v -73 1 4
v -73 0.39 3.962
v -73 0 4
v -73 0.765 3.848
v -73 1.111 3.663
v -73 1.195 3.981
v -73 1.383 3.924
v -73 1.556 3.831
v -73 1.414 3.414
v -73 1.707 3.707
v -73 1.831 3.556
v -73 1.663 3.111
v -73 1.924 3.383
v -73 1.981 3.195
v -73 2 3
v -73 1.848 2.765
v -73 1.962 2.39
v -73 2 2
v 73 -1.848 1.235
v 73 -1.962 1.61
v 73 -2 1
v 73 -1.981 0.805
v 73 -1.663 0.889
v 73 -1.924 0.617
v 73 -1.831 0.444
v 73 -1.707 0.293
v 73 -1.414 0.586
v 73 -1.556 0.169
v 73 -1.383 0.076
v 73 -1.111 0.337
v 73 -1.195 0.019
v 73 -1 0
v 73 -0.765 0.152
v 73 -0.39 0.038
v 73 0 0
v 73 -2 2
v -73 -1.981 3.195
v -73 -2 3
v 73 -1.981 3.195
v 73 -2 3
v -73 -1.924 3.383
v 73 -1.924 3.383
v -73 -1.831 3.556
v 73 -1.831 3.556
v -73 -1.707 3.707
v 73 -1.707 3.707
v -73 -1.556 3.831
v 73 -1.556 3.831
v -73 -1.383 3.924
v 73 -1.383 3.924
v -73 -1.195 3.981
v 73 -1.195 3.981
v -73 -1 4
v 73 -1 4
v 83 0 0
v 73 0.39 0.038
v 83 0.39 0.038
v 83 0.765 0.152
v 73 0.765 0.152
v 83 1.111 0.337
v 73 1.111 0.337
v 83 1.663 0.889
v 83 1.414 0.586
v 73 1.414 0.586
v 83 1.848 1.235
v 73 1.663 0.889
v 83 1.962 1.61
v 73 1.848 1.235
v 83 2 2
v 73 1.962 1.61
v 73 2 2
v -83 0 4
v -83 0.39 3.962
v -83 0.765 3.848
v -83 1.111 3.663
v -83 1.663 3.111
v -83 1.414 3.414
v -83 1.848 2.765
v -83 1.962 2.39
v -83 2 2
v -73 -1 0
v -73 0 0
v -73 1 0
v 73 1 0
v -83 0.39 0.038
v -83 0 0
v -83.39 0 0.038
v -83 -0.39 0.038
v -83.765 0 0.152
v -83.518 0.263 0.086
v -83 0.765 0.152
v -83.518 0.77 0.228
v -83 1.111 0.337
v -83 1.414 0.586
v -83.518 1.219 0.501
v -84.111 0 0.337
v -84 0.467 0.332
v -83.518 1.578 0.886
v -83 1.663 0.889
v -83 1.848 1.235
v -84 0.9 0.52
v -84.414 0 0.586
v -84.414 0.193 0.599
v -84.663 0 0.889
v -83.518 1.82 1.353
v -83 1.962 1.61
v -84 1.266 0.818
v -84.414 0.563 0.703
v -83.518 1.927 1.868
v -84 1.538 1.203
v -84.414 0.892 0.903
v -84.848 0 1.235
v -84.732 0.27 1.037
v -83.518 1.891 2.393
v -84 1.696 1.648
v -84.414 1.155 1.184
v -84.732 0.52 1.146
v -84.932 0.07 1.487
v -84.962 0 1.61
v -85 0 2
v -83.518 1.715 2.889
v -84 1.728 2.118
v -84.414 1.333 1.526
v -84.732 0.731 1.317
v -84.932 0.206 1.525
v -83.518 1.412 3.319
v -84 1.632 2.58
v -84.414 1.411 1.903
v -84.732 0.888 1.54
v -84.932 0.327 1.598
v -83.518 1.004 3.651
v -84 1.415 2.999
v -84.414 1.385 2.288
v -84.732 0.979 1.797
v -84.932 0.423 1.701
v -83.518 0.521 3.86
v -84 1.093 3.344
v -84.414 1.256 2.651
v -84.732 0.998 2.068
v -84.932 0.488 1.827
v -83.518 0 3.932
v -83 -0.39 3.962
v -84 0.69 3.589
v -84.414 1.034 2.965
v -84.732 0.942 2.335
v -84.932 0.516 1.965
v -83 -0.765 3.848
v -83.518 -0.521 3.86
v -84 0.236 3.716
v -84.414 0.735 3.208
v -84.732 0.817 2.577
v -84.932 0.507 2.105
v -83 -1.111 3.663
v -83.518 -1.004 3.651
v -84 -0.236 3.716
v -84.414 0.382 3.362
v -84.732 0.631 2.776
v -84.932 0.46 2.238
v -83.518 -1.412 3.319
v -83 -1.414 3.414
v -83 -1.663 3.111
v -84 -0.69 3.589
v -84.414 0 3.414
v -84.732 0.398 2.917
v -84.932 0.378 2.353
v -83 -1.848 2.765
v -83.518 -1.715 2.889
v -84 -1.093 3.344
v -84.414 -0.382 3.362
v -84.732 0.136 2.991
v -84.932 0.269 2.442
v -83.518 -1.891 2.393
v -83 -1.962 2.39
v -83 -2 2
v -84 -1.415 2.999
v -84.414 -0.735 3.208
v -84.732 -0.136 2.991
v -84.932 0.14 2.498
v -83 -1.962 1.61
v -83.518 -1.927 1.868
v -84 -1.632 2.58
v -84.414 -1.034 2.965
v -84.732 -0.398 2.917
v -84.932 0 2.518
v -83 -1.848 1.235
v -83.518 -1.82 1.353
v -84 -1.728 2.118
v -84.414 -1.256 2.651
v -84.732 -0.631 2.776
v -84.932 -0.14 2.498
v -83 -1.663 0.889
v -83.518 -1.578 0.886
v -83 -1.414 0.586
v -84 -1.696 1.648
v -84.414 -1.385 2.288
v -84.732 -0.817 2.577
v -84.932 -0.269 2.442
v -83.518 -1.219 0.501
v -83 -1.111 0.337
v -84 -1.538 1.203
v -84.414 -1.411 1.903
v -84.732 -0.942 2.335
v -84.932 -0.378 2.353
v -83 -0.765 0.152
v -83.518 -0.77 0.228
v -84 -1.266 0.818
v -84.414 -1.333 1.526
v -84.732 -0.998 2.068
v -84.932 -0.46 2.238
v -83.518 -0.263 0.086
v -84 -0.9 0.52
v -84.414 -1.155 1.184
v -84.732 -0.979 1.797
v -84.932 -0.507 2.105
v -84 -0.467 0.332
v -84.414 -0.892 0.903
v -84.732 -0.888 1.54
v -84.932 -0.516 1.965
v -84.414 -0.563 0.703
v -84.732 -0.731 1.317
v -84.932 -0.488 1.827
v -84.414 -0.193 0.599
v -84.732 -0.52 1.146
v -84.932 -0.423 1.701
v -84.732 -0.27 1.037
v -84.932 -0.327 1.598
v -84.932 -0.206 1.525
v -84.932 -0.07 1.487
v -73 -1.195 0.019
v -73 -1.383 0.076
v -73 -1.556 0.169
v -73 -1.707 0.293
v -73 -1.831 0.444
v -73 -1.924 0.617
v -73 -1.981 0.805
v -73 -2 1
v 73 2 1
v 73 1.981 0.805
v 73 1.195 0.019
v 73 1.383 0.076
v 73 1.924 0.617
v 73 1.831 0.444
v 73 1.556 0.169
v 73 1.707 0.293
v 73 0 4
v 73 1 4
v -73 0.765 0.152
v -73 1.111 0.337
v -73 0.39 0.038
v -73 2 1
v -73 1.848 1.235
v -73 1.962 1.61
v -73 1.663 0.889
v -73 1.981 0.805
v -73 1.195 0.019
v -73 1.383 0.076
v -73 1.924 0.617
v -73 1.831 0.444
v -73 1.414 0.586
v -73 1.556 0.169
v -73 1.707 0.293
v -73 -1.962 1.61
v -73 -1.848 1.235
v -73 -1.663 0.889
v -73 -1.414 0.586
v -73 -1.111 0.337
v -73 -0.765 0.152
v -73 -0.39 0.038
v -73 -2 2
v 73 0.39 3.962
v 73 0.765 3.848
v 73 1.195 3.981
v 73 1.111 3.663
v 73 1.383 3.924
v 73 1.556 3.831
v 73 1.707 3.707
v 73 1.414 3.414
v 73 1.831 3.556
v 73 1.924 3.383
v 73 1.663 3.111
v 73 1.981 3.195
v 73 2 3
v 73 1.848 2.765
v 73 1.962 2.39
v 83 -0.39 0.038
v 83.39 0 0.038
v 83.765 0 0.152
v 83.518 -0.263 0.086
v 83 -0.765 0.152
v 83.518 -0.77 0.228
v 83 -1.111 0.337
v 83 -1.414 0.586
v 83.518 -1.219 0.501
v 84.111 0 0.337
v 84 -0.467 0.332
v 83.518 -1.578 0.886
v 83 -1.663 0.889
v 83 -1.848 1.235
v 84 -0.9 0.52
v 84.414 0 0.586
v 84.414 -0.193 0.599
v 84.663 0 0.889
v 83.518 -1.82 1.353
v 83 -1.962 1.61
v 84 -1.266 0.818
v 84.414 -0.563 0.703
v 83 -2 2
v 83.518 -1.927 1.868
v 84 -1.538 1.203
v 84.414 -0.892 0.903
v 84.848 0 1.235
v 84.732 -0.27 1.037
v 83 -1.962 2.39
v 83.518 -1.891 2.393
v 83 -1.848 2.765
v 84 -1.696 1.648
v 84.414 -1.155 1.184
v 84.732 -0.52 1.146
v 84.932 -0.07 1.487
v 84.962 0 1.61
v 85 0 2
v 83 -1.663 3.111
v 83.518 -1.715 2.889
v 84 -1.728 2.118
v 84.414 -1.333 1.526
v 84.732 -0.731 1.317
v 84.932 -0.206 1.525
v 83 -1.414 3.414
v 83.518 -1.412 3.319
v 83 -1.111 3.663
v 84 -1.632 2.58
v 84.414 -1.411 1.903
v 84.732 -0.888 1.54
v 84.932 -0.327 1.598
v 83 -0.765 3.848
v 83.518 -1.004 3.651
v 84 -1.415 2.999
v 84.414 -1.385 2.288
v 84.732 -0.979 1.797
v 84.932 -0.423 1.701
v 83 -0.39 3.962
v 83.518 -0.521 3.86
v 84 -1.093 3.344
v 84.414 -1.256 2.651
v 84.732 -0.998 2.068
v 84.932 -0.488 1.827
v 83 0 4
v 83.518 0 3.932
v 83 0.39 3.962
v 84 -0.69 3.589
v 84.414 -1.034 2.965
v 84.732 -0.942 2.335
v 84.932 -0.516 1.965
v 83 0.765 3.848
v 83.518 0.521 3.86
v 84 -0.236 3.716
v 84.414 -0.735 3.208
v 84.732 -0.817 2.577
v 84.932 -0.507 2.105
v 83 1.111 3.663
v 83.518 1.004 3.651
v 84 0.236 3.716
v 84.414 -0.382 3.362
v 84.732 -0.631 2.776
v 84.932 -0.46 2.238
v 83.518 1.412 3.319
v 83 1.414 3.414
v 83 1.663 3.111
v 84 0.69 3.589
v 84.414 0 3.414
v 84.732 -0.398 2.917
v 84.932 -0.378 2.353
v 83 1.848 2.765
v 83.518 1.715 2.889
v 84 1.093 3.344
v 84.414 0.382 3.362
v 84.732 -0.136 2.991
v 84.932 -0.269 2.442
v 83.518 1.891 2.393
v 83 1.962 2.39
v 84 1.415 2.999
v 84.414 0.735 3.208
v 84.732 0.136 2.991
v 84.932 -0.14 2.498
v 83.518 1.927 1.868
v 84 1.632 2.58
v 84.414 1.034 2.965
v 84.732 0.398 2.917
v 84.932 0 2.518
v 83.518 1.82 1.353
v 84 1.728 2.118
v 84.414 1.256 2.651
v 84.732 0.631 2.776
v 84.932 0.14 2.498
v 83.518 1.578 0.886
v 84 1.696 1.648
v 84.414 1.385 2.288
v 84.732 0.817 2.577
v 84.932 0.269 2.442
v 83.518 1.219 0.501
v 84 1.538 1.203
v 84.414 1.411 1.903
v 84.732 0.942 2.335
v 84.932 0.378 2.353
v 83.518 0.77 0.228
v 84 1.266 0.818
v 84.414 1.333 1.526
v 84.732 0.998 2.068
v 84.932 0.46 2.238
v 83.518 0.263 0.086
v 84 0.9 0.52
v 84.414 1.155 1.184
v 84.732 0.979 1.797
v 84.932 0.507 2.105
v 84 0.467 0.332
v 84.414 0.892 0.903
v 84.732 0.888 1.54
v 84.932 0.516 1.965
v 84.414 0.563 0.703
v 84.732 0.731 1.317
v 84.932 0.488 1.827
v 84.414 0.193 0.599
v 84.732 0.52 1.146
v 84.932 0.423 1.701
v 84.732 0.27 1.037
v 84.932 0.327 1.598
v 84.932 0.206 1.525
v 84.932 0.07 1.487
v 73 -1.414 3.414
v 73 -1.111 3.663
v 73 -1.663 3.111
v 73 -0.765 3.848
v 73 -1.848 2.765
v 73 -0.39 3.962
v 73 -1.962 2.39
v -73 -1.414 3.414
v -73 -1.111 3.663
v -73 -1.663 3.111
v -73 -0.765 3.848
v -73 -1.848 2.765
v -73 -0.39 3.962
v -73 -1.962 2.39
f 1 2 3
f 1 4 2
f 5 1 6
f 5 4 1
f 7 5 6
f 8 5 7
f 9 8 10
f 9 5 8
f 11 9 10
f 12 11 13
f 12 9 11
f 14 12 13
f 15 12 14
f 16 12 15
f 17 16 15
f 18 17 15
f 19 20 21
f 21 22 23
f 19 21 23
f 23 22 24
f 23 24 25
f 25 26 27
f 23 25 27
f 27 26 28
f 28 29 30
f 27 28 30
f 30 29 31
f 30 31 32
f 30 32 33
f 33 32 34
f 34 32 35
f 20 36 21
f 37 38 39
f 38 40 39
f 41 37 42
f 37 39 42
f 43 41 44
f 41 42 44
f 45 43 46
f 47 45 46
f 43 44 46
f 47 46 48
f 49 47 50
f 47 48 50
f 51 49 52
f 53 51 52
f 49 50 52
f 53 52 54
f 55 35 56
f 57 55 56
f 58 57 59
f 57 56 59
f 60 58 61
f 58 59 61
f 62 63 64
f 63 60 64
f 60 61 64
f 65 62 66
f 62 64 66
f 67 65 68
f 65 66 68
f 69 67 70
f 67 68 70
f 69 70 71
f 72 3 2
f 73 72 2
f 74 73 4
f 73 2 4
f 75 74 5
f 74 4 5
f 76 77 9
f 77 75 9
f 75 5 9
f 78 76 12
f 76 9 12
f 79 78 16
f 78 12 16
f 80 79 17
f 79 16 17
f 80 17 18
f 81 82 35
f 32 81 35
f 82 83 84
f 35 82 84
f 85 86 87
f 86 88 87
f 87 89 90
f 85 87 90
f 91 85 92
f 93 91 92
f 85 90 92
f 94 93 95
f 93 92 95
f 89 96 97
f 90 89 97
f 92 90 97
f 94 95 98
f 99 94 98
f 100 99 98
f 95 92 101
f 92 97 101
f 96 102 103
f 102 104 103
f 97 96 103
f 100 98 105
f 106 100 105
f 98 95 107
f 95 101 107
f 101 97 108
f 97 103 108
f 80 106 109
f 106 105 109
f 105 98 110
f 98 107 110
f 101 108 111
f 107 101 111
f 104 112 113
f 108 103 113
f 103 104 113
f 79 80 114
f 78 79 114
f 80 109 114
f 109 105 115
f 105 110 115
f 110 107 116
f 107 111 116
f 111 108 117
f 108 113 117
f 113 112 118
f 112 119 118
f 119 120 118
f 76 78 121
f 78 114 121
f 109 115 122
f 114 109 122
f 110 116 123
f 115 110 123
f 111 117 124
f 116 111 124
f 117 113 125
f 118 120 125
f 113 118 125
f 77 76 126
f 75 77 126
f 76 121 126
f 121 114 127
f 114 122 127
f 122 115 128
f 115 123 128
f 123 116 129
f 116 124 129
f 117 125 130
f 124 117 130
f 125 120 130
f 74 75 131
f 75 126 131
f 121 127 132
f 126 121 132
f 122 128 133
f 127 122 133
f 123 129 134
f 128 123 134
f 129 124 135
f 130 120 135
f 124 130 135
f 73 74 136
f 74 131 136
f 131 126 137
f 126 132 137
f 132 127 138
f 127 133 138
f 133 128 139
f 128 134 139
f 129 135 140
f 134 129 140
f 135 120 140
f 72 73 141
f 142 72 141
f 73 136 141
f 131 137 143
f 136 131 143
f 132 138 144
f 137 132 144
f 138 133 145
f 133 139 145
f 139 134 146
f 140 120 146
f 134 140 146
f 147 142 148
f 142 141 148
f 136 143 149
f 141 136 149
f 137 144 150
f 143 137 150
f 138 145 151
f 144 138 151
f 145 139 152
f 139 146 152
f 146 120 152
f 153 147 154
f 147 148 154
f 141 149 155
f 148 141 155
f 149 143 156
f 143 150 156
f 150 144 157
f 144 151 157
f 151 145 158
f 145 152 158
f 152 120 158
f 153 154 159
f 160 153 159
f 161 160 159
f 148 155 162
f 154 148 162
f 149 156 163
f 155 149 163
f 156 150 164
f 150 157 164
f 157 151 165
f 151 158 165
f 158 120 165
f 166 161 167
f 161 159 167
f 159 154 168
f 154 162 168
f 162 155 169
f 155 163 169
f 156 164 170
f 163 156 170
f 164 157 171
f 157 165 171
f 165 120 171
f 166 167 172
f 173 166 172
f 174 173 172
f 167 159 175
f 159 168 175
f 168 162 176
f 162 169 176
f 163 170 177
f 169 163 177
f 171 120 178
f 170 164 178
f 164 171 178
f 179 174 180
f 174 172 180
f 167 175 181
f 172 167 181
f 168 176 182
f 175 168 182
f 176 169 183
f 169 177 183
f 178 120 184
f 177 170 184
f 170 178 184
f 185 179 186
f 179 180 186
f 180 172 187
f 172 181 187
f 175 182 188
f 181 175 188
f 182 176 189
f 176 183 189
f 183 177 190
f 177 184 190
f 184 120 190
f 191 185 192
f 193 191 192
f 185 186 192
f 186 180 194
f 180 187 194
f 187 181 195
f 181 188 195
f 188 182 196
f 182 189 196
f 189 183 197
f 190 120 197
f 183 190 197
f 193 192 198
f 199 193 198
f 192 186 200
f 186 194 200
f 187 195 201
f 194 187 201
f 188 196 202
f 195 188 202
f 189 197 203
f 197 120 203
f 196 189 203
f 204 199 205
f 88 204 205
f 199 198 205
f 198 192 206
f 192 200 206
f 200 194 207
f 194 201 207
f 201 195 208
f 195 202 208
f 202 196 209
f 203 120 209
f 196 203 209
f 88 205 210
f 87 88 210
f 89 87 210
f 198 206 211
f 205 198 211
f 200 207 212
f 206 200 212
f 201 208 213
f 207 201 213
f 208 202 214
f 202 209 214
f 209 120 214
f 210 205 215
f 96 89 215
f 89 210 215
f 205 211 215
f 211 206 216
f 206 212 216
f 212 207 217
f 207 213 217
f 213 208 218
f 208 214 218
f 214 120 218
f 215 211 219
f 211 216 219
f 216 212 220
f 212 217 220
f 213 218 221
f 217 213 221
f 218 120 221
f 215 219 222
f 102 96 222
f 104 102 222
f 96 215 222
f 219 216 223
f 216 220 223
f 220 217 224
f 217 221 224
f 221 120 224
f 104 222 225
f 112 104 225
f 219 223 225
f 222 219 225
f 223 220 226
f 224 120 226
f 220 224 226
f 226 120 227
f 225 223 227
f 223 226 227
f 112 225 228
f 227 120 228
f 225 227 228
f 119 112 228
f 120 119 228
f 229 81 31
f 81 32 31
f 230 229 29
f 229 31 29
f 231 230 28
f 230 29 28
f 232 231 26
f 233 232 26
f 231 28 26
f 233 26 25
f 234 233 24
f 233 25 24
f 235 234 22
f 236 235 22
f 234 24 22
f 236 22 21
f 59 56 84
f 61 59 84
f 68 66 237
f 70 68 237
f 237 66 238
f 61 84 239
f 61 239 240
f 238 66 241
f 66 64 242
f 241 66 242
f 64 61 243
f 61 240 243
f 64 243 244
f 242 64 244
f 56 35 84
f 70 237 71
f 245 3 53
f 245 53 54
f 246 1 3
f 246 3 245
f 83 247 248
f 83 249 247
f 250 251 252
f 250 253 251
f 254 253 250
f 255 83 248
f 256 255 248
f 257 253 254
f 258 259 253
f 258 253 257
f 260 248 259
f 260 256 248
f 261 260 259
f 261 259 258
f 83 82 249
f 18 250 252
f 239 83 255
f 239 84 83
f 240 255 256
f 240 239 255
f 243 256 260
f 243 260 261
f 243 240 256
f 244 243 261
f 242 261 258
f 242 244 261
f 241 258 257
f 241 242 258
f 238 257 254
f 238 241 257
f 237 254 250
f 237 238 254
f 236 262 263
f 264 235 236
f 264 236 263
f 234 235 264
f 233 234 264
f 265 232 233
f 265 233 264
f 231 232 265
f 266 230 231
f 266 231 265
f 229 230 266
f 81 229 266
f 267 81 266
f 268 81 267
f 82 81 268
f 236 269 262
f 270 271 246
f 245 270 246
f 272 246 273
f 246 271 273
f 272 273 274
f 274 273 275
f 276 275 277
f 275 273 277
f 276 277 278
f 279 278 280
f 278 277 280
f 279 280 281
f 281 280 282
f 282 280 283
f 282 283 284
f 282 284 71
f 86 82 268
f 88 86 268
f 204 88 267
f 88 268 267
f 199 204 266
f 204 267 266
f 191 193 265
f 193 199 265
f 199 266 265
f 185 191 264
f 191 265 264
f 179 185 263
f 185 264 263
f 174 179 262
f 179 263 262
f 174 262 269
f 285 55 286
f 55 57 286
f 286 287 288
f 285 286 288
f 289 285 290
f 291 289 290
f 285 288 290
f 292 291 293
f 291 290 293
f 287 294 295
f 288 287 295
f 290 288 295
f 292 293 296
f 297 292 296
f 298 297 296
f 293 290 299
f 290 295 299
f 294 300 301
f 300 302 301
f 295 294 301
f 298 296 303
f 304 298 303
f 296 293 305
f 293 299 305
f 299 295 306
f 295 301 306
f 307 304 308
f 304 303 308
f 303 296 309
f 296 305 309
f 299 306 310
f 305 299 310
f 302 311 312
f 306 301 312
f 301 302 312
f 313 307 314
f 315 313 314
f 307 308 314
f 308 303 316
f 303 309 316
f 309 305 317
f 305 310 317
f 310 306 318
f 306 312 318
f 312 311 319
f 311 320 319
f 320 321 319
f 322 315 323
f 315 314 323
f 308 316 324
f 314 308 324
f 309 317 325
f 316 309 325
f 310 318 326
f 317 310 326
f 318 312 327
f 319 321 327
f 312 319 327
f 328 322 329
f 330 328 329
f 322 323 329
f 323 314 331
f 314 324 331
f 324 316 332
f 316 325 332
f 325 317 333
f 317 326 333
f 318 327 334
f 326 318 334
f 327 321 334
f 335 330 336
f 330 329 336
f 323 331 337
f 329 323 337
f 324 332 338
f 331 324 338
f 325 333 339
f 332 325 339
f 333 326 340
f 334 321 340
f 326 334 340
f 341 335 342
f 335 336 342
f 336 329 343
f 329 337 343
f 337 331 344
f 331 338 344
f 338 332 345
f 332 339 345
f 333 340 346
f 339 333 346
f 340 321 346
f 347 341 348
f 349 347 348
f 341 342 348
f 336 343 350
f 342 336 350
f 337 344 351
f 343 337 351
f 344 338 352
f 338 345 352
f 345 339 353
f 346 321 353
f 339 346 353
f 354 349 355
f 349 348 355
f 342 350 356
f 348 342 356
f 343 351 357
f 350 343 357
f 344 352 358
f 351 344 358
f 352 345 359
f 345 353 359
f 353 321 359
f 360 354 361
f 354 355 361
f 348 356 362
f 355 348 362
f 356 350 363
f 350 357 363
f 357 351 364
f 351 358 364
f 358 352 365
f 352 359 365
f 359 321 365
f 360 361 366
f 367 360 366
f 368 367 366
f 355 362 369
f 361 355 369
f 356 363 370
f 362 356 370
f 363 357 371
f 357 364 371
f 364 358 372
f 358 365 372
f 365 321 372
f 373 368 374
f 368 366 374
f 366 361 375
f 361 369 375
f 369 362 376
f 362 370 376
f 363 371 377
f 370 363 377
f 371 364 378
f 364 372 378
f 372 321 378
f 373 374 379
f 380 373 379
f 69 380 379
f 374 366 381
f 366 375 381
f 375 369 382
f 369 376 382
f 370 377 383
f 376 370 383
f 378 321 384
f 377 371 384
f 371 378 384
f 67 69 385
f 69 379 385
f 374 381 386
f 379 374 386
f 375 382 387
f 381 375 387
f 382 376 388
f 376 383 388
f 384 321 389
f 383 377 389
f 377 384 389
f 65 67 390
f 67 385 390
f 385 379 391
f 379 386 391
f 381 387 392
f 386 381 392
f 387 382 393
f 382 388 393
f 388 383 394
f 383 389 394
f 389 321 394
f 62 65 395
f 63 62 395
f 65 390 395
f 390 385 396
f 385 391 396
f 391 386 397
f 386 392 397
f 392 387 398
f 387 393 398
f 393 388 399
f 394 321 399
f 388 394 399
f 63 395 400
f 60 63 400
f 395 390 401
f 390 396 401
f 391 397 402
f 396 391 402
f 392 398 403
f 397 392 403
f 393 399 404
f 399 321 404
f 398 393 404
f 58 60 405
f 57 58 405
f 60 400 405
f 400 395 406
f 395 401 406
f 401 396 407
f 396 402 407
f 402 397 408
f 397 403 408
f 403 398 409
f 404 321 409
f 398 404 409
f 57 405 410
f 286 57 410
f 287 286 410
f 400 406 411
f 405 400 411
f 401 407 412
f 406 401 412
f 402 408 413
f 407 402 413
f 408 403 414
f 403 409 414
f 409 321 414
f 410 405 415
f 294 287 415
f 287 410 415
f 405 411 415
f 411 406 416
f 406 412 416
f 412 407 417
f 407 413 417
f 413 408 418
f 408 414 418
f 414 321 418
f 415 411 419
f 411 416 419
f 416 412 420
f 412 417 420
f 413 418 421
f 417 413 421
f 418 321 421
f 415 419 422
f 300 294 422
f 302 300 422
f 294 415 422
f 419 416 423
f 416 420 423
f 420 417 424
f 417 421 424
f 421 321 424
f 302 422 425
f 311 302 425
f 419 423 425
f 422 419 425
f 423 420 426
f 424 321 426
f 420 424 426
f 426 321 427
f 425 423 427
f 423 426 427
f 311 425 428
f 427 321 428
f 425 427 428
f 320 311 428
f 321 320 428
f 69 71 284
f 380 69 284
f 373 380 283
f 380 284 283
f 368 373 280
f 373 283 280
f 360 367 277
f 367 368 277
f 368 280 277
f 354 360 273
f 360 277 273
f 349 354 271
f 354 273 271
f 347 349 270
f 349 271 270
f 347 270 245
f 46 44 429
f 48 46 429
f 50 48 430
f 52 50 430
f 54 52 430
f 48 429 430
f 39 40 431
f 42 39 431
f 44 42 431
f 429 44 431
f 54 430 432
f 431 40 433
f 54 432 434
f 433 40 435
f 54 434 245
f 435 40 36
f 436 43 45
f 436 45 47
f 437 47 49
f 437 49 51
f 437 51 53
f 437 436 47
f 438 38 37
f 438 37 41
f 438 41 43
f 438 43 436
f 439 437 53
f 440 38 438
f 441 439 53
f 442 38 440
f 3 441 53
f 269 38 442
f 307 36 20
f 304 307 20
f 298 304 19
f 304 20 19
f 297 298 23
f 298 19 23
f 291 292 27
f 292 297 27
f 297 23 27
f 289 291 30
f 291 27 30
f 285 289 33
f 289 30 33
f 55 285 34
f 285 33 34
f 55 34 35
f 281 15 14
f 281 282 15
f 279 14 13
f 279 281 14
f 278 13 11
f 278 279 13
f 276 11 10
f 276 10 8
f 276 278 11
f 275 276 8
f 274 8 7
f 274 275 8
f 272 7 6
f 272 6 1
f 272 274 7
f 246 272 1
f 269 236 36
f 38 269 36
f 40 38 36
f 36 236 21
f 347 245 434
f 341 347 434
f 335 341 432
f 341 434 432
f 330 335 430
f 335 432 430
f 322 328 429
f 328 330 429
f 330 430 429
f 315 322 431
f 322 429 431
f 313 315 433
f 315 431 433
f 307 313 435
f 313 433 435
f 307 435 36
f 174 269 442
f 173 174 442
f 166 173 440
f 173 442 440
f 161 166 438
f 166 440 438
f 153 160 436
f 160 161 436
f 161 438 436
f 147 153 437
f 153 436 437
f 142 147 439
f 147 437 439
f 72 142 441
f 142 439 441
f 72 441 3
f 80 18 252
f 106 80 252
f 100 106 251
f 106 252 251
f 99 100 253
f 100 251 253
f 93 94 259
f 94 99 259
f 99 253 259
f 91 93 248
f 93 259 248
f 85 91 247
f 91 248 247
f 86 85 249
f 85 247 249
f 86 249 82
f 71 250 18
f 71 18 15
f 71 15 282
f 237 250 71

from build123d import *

# Parameters (mm, degrees)
F0_W     = 146
F0_H     = 4
F1_DEPTH = 4
F3_DEPTH = 12
F6_DEPTH = 12
F8_R     = 1


# Not quite as in the source:
# - a fillet or chamfer that OpenCascade refuses, or shapes differently, is made with other operations: its cross-section is extruded or revolved along the edge and cut away or added


with BuildPart() as f1:
    # F0 (on Top) → F1 (new body)
    with BuildSketch(Plane.XY):
        Rectangle(F0_W, F0_H)
    extrude(amount=F1_DEPTH)

    # F2 (on face) → F3 (join)
    with BuildSketch(Plane(origin=(-73, 0, 0), x_dir=(0, -1, 0), z_dir=(-1, 0, 0))):
        with BuildLine():
            ThreePointArc((0, 0), (1.4142135624, 0.5857864376), (2, 2))
            ThreePointArc((2, 2), (1.4142135624, 3.4142135624), (0, 4))
            ThreePointArc((0, 4), (-1.4142135624, 3.4142135624), (-2, 2))
            ThreePointArc((-2, 2), (-1.4142135624, 0.5857864376), (0, 0))
        make_face()
    extrude(amount=F3_DEPTH)

    # F4: fillet of radius 2 on 1 edges, made by hand

    # F4_s1 → F4_t2 (revolve, cut)
    with BuildSketch(Plane.XZ):
        with BuildLine():
            ThreePointArc((-83, 0), (-84.4142135624, 0.5857864376), (-85, 2))
            Line((-85, 2), (-85, 0))
            Line((-85, 0), (-83, 0))
        make_face()
    revolve(axis=Axis((-85, 0, 2), (1, 0, 0)), mode=Mode.SUBTRACT)

    # F5 (on face) → F6 (join)
    with BuildSketch(Plane.YZ.offset(73)):
        with BuildLine():
            ThreePointArc((0, 0), (1.4142135624, 0.5857864376), (2, 2))
            ThreePointArc((2, 2), (1.4142135624, 3.4142135624), (0, 4))
            ThreePointArc((0, 4), (-1.4142135624, 3.4142135624), (-2, 2))
            ThreePointArc((-2, 2), (-1.4142135624, 0.5857864376), (0, 0))
        make_face()
    extrude(amount=F6_DEPTH)

    # F7: fillet of radius 2 on 1 edges, made by hand

    # F7_s1 → F7_t2 (revolve, cut)
    with BuildSketch(Plane.XZ):
        with BuildLine():
            ThreePointArc((83, 0), (84.4142135624, 0.5857864376), (85, 2))
            Line((85, 2), (85, 0))
            Line((85, 0), (83, 0))
        make_face()
    revolve(axis=Axis((85, 0, 2), (-1, 0, 0)), mode=Mode.SUBTRACT)

    # F8
    f8_edges = [f1.edges().sort_by_distance(p)[0] for p in [
        (0, -2, 4),
        (0, -2, 0),
        (0, 2, 0),
        (0, 2, 4),
    ]]
    fillet(f8_edges, radius=F8_R)


solid = f1.part
